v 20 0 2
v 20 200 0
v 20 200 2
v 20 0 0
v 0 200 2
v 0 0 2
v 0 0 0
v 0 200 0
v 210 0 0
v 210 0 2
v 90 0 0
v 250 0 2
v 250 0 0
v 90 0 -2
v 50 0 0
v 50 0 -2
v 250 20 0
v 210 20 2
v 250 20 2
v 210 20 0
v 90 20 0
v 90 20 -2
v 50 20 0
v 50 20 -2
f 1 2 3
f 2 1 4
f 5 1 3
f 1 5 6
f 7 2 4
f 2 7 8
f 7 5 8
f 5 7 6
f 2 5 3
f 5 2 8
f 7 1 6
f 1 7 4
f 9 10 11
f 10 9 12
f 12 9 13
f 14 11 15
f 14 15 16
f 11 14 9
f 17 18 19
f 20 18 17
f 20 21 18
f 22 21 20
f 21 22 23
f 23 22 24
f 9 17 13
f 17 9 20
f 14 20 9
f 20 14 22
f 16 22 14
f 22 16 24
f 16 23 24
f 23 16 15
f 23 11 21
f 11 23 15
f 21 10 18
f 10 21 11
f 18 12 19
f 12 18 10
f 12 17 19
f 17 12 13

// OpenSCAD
// en: flat profile
// fr: profile plat

function flat_profile_width() = 20;

function flat_profile_depth() = 2;

module flat_profile(length) {
  cube([flat_profile_width(), length, flat_profile_depth()]);
}

// slightly bended flat profile used as diagonal bar between vertical and horizontal axes
module flat_profile_bended(length) {
  bending_offset = length/5;

  rotate([-90,0,0])
    linear_extrude(flat_profile_width())
      polygon([
        [0,0],
        [0,flat_profile_depth()],
        [bending_offset,flat_profile_depth()],
        [length-bending_offset,0],
        [length,0],
        [length,-flat_profile_depth()],
        [length-bending_offset,-flat_profile_depth()],
        [bending_offset,0],
        [0,0]
      ]);
}

flat_profile(200);

translate([50,0,0])
  flat_profile_bended(200);
